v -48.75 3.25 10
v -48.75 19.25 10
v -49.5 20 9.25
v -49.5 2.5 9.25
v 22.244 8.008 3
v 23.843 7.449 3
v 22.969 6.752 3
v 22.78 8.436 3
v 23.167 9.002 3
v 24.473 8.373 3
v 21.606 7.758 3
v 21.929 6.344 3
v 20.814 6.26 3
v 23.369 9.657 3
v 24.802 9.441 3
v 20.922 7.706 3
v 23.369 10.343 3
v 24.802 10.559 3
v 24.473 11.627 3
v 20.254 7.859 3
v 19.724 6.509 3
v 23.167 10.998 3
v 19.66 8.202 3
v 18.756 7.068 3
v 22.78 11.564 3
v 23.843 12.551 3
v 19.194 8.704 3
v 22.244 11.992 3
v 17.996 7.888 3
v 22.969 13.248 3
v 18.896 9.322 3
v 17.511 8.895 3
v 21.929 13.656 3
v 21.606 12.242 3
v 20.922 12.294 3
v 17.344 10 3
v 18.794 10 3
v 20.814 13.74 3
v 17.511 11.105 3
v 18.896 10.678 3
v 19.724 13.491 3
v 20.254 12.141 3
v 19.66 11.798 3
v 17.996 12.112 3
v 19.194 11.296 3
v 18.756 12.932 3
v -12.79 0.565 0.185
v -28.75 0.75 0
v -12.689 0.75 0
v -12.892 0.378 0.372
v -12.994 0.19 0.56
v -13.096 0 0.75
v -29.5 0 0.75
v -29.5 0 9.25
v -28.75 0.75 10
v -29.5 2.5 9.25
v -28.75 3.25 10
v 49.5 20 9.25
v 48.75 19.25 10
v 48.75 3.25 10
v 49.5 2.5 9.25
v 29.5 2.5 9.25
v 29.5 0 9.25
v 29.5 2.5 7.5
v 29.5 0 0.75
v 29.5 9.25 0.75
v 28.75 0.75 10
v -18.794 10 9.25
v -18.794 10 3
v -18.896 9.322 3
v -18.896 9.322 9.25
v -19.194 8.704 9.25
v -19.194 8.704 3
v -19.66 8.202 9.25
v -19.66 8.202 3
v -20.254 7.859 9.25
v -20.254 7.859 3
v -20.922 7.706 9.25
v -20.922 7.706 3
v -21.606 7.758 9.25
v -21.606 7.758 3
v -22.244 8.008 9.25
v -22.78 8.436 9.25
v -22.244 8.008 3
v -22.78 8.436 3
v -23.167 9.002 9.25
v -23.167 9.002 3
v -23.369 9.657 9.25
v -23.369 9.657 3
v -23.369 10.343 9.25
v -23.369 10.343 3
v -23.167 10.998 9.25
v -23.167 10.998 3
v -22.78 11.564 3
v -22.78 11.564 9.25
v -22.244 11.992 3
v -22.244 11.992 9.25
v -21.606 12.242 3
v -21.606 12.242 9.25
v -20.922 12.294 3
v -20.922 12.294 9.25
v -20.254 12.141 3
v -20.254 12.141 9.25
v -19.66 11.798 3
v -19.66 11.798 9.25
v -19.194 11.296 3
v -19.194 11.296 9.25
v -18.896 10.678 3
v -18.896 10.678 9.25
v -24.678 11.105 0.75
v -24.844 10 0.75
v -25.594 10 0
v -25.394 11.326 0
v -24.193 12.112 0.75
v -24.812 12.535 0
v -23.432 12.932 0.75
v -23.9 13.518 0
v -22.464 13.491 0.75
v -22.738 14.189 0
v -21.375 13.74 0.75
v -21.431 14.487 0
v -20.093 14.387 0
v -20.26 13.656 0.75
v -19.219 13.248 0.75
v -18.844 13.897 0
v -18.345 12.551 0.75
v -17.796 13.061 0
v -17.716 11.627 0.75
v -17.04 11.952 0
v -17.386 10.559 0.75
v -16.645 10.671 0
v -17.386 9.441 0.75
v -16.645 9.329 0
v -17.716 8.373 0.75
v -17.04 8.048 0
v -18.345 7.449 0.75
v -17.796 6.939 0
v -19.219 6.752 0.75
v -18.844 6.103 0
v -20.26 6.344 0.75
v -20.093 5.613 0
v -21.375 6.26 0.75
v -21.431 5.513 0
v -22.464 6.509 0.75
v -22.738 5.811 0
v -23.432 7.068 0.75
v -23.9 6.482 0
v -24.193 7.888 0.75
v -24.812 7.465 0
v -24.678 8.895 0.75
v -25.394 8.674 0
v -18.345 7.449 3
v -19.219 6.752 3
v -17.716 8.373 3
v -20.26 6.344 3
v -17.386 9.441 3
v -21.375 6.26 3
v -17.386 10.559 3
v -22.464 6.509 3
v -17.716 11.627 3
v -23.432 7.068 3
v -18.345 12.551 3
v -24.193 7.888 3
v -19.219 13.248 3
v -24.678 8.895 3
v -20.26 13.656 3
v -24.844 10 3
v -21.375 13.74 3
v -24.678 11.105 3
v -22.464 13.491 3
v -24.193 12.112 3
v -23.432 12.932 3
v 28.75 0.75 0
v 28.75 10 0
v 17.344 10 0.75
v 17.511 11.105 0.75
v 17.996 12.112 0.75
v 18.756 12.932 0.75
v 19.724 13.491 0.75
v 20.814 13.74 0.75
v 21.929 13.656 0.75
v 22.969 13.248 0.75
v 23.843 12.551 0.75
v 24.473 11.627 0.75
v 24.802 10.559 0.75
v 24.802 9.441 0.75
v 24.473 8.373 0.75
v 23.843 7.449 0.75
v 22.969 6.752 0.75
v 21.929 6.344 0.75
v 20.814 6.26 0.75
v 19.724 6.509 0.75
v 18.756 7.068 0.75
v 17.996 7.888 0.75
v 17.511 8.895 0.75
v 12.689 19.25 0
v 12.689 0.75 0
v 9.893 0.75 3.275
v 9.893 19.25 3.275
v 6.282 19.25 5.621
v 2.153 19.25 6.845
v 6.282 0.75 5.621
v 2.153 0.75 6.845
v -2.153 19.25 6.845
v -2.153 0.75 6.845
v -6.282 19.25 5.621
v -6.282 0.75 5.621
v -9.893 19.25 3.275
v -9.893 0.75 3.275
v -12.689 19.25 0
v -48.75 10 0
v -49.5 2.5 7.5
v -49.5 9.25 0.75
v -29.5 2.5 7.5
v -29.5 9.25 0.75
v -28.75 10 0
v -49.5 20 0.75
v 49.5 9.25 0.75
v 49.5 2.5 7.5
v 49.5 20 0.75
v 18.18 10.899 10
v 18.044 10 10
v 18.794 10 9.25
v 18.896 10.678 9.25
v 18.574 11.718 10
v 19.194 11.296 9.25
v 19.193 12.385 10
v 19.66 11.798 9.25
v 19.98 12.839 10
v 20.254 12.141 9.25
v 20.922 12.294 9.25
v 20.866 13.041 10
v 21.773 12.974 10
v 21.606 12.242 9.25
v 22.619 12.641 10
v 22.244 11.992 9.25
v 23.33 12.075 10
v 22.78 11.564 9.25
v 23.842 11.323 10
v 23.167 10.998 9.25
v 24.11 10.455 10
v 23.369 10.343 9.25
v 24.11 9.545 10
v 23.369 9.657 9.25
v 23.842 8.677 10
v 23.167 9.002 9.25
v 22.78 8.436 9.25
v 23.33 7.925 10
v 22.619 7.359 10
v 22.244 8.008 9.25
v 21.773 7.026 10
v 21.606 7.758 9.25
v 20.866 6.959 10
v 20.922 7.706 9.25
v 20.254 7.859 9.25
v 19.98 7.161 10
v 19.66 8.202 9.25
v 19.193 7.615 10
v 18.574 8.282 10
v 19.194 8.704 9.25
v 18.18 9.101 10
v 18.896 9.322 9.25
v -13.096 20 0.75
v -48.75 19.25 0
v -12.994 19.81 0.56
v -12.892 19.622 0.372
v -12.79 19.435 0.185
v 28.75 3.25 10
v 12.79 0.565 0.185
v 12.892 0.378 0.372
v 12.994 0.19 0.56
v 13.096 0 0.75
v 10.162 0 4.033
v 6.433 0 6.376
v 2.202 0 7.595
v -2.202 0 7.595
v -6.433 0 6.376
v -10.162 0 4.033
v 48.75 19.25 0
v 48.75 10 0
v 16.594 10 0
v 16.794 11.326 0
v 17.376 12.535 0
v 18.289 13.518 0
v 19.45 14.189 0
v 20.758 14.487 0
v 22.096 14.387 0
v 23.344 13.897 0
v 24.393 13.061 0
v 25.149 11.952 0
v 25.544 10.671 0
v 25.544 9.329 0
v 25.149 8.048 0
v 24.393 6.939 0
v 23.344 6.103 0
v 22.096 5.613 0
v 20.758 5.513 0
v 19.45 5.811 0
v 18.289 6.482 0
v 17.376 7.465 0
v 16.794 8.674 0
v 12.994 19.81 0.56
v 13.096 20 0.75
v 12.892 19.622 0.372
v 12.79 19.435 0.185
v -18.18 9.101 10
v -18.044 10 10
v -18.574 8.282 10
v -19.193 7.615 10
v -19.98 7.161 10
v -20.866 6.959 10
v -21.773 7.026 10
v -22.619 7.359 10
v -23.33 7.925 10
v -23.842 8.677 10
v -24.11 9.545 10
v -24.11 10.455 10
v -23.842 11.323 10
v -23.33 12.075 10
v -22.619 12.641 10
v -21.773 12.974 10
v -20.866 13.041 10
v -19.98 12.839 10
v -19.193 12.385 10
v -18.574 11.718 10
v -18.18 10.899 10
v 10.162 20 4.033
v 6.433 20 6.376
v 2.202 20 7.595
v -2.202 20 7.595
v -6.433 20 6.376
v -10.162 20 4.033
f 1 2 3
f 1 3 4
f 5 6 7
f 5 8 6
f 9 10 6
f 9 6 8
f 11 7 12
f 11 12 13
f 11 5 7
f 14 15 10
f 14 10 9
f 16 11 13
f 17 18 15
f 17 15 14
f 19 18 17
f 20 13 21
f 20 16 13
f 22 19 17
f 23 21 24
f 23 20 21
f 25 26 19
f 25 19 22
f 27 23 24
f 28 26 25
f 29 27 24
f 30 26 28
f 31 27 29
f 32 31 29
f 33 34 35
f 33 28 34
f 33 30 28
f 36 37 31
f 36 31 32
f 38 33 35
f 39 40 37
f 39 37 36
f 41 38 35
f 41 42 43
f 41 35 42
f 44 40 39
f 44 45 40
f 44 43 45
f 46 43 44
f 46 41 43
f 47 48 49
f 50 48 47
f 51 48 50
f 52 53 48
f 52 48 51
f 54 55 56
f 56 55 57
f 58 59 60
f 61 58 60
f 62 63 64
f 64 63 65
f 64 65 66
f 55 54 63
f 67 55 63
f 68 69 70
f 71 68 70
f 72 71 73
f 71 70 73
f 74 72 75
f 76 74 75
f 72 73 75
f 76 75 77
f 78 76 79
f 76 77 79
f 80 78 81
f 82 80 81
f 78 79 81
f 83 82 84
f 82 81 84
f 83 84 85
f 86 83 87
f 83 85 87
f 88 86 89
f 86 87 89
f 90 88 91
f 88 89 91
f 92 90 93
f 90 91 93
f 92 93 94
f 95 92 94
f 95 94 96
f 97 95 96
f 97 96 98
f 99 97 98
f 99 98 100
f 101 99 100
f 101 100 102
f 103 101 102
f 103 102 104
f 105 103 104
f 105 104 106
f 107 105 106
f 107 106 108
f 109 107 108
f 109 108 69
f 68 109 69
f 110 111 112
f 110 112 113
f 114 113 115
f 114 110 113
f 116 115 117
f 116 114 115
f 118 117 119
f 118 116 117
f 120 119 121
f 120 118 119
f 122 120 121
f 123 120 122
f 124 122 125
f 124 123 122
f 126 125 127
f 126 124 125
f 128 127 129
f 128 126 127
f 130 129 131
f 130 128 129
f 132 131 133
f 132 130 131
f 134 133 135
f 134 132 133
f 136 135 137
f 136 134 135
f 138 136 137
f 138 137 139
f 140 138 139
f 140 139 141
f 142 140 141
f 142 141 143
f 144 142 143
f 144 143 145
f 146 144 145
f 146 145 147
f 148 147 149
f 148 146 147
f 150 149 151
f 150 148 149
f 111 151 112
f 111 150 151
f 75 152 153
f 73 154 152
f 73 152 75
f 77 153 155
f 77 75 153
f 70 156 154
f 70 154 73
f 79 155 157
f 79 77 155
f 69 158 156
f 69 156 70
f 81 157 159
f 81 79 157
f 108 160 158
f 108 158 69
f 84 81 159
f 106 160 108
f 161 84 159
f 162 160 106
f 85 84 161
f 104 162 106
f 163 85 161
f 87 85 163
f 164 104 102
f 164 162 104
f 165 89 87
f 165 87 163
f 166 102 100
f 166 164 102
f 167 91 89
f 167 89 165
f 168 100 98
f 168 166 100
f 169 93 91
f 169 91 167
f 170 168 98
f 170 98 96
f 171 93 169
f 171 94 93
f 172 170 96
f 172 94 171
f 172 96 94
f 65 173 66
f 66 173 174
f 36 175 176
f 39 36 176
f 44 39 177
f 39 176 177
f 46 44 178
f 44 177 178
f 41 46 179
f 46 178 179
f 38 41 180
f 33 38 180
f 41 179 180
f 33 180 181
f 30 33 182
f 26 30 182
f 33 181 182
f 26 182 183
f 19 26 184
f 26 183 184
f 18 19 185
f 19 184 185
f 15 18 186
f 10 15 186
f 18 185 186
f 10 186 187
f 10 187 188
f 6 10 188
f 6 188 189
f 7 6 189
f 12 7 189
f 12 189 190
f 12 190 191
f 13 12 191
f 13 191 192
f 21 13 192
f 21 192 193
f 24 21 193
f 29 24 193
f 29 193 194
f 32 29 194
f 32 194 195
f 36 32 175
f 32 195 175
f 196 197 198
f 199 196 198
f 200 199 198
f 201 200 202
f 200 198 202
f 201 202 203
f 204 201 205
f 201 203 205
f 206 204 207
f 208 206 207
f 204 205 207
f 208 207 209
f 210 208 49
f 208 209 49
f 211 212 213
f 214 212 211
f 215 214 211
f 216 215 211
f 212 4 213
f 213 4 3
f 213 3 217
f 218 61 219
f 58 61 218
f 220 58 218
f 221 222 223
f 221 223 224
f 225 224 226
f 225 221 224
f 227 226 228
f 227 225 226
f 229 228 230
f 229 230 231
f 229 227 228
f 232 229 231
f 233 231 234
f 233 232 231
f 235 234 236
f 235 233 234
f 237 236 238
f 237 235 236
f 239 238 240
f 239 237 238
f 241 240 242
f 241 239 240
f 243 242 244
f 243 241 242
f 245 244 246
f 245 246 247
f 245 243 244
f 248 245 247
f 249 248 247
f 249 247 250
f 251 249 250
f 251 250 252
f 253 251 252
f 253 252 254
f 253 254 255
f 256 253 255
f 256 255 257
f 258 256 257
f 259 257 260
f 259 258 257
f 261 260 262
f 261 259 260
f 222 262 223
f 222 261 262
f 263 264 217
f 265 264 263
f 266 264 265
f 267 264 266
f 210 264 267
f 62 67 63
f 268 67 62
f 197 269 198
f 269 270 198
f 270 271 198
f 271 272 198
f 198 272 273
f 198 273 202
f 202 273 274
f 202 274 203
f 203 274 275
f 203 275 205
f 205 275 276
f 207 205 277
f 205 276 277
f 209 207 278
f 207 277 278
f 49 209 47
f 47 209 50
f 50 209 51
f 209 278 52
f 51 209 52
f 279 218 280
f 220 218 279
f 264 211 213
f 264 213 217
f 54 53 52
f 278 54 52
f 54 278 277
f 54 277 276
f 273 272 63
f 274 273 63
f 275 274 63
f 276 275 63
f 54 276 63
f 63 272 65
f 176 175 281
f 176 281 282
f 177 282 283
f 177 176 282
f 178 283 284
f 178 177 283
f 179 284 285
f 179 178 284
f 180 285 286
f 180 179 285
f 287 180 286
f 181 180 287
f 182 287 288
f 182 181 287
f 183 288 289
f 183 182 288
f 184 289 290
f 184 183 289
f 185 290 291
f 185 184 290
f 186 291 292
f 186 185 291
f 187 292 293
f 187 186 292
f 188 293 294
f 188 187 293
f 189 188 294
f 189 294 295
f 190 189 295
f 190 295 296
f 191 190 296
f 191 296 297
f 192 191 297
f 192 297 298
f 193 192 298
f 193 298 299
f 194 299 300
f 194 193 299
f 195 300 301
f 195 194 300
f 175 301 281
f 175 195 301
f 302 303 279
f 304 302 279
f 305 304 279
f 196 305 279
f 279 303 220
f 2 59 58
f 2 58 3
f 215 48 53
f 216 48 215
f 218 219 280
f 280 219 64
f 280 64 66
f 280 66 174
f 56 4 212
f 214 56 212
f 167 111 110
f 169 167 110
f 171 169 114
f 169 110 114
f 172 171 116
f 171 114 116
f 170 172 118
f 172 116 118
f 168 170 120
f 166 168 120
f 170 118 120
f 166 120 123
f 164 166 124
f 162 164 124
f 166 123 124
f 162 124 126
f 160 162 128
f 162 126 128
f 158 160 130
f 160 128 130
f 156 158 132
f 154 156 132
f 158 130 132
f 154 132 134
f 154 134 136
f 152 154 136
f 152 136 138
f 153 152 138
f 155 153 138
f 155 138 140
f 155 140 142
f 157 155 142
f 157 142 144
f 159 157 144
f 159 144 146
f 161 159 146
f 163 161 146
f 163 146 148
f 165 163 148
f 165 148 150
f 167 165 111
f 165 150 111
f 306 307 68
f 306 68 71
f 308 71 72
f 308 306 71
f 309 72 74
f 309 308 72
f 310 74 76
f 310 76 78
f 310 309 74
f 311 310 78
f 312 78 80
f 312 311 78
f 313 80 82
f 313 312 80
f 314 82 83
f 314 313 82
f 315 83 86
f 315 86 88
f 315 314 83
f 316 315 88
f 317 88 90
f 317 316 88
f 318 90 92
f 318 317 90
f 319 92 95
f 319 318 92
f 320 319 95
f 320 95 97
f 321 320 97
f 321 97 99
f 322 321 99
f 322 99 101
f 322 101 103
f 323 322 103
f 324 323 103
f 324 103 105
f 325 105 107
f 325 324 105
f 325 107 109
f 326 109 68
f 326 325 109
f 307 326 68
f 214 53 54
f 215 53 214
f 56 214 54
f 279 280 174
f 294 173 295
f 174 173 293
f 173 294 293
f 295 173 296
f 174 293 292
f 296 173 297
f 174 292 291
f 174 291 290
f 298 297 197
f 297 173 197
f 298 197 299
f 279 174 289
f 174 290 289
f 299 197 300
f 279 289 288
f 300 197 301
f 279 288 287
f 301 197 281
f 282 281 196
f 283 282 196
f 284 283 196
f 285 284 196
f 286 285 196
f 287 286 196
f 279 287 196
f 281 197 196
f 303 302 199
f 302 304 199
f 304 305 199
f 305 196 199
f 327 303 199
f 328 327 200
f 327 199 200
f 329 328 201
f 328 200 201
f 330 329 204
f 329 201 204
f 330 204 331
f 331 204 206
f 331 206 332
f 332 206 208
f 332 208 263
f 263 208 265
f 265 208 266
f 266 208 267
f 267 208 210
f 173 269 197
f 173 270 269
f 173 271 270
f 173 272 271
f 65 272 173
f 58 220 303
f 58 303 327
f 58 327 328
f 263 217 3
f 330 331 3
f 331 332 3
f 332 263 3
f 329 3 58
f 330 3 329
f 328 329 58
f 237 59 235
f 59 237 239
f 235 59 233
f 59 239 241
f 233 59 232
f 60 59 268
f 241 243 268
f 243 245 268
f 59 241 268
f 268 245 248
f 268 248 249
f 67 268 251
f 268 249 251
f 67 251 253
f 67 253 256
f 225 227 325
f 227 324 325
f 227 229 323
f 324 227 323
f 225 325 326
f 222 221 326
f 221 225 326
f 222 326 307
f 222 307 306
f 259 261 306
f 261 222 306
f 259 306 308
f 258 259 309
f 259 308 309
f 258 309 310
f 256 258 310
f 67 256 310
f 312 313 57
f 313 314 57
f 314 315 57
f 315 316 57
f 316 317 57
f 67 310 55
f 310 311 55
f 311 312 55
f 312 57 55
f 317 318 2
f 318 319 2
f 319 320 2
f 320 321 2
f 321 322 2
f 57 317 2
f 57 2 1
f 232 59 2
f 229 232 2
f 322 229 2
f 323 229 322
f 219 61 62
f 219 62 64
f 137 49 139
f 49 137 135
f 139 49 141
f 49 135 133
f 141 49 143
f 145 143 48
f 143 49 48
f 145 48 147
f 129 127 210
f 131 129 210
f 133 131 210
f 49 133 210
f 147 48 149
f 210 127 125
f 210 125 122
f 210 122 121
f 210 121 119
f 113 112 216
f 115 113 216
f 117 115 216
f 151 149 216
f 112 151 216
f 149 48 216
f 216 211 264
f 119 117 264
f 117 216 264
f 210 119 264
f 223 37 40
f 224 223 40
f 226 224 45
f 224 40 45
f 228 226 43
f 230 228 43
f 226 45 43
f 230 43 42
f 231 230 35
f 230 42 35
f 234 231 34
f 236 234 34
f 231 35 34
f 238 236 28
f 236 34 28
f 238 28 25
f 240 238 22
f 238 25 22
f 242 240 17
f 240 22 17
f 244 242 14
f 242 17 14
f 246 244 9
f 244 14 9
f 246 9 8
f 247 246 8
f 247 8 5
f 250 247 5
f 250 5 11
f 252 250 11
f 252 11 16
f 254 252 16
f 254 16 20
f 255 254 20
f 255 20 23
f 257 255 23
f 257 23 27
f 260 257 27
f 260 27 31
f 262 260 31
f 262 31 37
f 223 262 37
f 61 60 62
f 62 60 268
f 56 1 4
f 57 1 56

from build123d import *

# Parameters (mm, degrees)
SKIZZE1_W                       = 59
SKIZZE1_H                       = 20
AUFSATZ_LINEAR_AUSTRAGEN1_DEPTH = 10
AUFSATZ_LINEAR_AUSTRAGEN2_DEPTH = 20
SKIZZE3_R                       = 15
SCHNITT_LINEAR_AUSTRAGEN1_DEPTH = 20
SKIZZE4_R                       = 2.3
SCHNITT_LINEAR_AUSTRAGEN2_DEPTH = 20
SKIZZE5_R                       = 3.75
SCHNITT_LINEAR_AUSTRAGEN3_DEPTH = 3
SCHNITT_LINEAR_AUSTRAGEN4_DEPTH = 20
FASE3_SIZE                      = 0.75


with BuildPart() as part:
    # Skizze1 → Aufsatz-Linear austragen1 (new body)
    with BuildSketch(Plane.XY):
        with Locations((0, 10)):
            Rectangle(SKIZZE1_W, SKIZZE1_H)
    extrude(amount=AUFSATZ_LINEAR_AUSTRAGEN1_DEPTH)

    # Skizze2 → Aufsatz-Linear austragen2 (add)
    with BuildSketch(Plane.ZY.offset(29.5)):
        Polygon((10, 0), (0, 10), (0, 20), (10, 20), align=None)
    aufsatz_linear_austragen2 = extrude(amount=AUFSATZ_LINEAR_AUSTRAGEN2_DEPTH)

    # Spiegeln1: Aufsatz-Linear austragen2 across plane
    add(aufsatz_linear_austragen2.mirror(Plane(origin=(0, 0, 0), x_dir=(0, 0, 1), z_dir=(1, 0, 0))))

    # Skizze3 → Schnitt-Linear austragen1 (cut)
    with BuildSketch(Plane.XZ):
        with Locations((0, -8)):
            Circle(SKIZZE3_R)
    extrude(amount=-SCHNITT_LINEAR_AUSTRAGEN1_DEPTH, mode=Mode.SUBTRACT)

    # Skizze4 → Schnitt-Linear austragen2 (cut)
    with BuildSketch(Plane(origin=(0, 0, 0), x_dir=(-1, 0, 0), z_dir=(0, 0, -1))):
        with Locations((-21.09428877, 10)):
            Circle(SKIZZE4_R)
        with Locations(Location((21.09428877, 10, 0), (0, 0, 180))):
            Circle(SKIZZE4_R)
    extrude(amount=-SCHNITT_LINEAR_AUSTRAGEN2_DEPTH, mode=Mode.SUBTRACT)

    # Skizze5 → Schnitt-Linear austragen3 (cut)
    with BuildSketch(Plane(origin=(0, 0, 0), x_dir=(-1, 0, 0), z_dir=(0, 0, -1))):
        with Locations((-21.09428877, 10)):
            Circle(SKIZZE5_R)
        with Locations((21.09428877, 10)):
            Circle(SKIZZE5_R)
    extrude(amount=-SCHNITT_LINEAR_AUSTRAGEN3_DEPTH, mode=Mode.SUBTRACT)

    # Skizze6 → Schnitt-Linear austragen4 (cut)
    with BuildSketch(Plane.ZY.offset(49.5)):
        Polygon((10, 2.5), (4.852604626, 2.5), (4.852604626, -2.668604054), (13.586779437, -2.788104879), (13.586779437, 2.151024835), align=None)
    schnitt_linear_austragen4 = extrude(amount=-SCHNITT_LINEAR_AUSTRAGEN4_DEPTH, mode=Mode.SUBTRACT)

    # Spiegeln3: Schnitt-Linear austragen4 across plane
    add(schnitt_linear_austragen4.mirror(Plane(origin=(0, 0, 0), x_dir=(0, 0, 1), z_dir=(1, 0, 0))), mode=Mode.SUBTRACT)

    # Fase3
    fase3_edges = [part.edges().sort_by_distance(p)[0] for p in [
        (39.5, 2.5, 10),
        (29.5, 1.25, 10),
        (0, 0, 10),
        (-29.5, 5, 0),
        (-49.5, 15, 0),
        (49.5, 15, 0),
        (-31.09428877, 20, 0),
        (21.09428877, 0, 0),
        (0, 20, 7),
        (0, 0, 7),
        (0, 20, 10),
        (29.5, 5, 0),
        (23.39428877, 10, 10),
        (-21.09428877, 0, 0),
        (-23.39428877, 10, 10),
        (31.09428877, 20, 0),
        (24.84428877, 10, 0),
        (-17.34428877, 10, 0),
        (-49.5, 11.25, 10),
        (-39.5, 2.5, 10),
        (-29.5, 1.25, 10),
        (49.5, 11.25, 10),
    ]]
    chamfer(fase3_edges, length=FASE3_SIZE)


solid = part.part
